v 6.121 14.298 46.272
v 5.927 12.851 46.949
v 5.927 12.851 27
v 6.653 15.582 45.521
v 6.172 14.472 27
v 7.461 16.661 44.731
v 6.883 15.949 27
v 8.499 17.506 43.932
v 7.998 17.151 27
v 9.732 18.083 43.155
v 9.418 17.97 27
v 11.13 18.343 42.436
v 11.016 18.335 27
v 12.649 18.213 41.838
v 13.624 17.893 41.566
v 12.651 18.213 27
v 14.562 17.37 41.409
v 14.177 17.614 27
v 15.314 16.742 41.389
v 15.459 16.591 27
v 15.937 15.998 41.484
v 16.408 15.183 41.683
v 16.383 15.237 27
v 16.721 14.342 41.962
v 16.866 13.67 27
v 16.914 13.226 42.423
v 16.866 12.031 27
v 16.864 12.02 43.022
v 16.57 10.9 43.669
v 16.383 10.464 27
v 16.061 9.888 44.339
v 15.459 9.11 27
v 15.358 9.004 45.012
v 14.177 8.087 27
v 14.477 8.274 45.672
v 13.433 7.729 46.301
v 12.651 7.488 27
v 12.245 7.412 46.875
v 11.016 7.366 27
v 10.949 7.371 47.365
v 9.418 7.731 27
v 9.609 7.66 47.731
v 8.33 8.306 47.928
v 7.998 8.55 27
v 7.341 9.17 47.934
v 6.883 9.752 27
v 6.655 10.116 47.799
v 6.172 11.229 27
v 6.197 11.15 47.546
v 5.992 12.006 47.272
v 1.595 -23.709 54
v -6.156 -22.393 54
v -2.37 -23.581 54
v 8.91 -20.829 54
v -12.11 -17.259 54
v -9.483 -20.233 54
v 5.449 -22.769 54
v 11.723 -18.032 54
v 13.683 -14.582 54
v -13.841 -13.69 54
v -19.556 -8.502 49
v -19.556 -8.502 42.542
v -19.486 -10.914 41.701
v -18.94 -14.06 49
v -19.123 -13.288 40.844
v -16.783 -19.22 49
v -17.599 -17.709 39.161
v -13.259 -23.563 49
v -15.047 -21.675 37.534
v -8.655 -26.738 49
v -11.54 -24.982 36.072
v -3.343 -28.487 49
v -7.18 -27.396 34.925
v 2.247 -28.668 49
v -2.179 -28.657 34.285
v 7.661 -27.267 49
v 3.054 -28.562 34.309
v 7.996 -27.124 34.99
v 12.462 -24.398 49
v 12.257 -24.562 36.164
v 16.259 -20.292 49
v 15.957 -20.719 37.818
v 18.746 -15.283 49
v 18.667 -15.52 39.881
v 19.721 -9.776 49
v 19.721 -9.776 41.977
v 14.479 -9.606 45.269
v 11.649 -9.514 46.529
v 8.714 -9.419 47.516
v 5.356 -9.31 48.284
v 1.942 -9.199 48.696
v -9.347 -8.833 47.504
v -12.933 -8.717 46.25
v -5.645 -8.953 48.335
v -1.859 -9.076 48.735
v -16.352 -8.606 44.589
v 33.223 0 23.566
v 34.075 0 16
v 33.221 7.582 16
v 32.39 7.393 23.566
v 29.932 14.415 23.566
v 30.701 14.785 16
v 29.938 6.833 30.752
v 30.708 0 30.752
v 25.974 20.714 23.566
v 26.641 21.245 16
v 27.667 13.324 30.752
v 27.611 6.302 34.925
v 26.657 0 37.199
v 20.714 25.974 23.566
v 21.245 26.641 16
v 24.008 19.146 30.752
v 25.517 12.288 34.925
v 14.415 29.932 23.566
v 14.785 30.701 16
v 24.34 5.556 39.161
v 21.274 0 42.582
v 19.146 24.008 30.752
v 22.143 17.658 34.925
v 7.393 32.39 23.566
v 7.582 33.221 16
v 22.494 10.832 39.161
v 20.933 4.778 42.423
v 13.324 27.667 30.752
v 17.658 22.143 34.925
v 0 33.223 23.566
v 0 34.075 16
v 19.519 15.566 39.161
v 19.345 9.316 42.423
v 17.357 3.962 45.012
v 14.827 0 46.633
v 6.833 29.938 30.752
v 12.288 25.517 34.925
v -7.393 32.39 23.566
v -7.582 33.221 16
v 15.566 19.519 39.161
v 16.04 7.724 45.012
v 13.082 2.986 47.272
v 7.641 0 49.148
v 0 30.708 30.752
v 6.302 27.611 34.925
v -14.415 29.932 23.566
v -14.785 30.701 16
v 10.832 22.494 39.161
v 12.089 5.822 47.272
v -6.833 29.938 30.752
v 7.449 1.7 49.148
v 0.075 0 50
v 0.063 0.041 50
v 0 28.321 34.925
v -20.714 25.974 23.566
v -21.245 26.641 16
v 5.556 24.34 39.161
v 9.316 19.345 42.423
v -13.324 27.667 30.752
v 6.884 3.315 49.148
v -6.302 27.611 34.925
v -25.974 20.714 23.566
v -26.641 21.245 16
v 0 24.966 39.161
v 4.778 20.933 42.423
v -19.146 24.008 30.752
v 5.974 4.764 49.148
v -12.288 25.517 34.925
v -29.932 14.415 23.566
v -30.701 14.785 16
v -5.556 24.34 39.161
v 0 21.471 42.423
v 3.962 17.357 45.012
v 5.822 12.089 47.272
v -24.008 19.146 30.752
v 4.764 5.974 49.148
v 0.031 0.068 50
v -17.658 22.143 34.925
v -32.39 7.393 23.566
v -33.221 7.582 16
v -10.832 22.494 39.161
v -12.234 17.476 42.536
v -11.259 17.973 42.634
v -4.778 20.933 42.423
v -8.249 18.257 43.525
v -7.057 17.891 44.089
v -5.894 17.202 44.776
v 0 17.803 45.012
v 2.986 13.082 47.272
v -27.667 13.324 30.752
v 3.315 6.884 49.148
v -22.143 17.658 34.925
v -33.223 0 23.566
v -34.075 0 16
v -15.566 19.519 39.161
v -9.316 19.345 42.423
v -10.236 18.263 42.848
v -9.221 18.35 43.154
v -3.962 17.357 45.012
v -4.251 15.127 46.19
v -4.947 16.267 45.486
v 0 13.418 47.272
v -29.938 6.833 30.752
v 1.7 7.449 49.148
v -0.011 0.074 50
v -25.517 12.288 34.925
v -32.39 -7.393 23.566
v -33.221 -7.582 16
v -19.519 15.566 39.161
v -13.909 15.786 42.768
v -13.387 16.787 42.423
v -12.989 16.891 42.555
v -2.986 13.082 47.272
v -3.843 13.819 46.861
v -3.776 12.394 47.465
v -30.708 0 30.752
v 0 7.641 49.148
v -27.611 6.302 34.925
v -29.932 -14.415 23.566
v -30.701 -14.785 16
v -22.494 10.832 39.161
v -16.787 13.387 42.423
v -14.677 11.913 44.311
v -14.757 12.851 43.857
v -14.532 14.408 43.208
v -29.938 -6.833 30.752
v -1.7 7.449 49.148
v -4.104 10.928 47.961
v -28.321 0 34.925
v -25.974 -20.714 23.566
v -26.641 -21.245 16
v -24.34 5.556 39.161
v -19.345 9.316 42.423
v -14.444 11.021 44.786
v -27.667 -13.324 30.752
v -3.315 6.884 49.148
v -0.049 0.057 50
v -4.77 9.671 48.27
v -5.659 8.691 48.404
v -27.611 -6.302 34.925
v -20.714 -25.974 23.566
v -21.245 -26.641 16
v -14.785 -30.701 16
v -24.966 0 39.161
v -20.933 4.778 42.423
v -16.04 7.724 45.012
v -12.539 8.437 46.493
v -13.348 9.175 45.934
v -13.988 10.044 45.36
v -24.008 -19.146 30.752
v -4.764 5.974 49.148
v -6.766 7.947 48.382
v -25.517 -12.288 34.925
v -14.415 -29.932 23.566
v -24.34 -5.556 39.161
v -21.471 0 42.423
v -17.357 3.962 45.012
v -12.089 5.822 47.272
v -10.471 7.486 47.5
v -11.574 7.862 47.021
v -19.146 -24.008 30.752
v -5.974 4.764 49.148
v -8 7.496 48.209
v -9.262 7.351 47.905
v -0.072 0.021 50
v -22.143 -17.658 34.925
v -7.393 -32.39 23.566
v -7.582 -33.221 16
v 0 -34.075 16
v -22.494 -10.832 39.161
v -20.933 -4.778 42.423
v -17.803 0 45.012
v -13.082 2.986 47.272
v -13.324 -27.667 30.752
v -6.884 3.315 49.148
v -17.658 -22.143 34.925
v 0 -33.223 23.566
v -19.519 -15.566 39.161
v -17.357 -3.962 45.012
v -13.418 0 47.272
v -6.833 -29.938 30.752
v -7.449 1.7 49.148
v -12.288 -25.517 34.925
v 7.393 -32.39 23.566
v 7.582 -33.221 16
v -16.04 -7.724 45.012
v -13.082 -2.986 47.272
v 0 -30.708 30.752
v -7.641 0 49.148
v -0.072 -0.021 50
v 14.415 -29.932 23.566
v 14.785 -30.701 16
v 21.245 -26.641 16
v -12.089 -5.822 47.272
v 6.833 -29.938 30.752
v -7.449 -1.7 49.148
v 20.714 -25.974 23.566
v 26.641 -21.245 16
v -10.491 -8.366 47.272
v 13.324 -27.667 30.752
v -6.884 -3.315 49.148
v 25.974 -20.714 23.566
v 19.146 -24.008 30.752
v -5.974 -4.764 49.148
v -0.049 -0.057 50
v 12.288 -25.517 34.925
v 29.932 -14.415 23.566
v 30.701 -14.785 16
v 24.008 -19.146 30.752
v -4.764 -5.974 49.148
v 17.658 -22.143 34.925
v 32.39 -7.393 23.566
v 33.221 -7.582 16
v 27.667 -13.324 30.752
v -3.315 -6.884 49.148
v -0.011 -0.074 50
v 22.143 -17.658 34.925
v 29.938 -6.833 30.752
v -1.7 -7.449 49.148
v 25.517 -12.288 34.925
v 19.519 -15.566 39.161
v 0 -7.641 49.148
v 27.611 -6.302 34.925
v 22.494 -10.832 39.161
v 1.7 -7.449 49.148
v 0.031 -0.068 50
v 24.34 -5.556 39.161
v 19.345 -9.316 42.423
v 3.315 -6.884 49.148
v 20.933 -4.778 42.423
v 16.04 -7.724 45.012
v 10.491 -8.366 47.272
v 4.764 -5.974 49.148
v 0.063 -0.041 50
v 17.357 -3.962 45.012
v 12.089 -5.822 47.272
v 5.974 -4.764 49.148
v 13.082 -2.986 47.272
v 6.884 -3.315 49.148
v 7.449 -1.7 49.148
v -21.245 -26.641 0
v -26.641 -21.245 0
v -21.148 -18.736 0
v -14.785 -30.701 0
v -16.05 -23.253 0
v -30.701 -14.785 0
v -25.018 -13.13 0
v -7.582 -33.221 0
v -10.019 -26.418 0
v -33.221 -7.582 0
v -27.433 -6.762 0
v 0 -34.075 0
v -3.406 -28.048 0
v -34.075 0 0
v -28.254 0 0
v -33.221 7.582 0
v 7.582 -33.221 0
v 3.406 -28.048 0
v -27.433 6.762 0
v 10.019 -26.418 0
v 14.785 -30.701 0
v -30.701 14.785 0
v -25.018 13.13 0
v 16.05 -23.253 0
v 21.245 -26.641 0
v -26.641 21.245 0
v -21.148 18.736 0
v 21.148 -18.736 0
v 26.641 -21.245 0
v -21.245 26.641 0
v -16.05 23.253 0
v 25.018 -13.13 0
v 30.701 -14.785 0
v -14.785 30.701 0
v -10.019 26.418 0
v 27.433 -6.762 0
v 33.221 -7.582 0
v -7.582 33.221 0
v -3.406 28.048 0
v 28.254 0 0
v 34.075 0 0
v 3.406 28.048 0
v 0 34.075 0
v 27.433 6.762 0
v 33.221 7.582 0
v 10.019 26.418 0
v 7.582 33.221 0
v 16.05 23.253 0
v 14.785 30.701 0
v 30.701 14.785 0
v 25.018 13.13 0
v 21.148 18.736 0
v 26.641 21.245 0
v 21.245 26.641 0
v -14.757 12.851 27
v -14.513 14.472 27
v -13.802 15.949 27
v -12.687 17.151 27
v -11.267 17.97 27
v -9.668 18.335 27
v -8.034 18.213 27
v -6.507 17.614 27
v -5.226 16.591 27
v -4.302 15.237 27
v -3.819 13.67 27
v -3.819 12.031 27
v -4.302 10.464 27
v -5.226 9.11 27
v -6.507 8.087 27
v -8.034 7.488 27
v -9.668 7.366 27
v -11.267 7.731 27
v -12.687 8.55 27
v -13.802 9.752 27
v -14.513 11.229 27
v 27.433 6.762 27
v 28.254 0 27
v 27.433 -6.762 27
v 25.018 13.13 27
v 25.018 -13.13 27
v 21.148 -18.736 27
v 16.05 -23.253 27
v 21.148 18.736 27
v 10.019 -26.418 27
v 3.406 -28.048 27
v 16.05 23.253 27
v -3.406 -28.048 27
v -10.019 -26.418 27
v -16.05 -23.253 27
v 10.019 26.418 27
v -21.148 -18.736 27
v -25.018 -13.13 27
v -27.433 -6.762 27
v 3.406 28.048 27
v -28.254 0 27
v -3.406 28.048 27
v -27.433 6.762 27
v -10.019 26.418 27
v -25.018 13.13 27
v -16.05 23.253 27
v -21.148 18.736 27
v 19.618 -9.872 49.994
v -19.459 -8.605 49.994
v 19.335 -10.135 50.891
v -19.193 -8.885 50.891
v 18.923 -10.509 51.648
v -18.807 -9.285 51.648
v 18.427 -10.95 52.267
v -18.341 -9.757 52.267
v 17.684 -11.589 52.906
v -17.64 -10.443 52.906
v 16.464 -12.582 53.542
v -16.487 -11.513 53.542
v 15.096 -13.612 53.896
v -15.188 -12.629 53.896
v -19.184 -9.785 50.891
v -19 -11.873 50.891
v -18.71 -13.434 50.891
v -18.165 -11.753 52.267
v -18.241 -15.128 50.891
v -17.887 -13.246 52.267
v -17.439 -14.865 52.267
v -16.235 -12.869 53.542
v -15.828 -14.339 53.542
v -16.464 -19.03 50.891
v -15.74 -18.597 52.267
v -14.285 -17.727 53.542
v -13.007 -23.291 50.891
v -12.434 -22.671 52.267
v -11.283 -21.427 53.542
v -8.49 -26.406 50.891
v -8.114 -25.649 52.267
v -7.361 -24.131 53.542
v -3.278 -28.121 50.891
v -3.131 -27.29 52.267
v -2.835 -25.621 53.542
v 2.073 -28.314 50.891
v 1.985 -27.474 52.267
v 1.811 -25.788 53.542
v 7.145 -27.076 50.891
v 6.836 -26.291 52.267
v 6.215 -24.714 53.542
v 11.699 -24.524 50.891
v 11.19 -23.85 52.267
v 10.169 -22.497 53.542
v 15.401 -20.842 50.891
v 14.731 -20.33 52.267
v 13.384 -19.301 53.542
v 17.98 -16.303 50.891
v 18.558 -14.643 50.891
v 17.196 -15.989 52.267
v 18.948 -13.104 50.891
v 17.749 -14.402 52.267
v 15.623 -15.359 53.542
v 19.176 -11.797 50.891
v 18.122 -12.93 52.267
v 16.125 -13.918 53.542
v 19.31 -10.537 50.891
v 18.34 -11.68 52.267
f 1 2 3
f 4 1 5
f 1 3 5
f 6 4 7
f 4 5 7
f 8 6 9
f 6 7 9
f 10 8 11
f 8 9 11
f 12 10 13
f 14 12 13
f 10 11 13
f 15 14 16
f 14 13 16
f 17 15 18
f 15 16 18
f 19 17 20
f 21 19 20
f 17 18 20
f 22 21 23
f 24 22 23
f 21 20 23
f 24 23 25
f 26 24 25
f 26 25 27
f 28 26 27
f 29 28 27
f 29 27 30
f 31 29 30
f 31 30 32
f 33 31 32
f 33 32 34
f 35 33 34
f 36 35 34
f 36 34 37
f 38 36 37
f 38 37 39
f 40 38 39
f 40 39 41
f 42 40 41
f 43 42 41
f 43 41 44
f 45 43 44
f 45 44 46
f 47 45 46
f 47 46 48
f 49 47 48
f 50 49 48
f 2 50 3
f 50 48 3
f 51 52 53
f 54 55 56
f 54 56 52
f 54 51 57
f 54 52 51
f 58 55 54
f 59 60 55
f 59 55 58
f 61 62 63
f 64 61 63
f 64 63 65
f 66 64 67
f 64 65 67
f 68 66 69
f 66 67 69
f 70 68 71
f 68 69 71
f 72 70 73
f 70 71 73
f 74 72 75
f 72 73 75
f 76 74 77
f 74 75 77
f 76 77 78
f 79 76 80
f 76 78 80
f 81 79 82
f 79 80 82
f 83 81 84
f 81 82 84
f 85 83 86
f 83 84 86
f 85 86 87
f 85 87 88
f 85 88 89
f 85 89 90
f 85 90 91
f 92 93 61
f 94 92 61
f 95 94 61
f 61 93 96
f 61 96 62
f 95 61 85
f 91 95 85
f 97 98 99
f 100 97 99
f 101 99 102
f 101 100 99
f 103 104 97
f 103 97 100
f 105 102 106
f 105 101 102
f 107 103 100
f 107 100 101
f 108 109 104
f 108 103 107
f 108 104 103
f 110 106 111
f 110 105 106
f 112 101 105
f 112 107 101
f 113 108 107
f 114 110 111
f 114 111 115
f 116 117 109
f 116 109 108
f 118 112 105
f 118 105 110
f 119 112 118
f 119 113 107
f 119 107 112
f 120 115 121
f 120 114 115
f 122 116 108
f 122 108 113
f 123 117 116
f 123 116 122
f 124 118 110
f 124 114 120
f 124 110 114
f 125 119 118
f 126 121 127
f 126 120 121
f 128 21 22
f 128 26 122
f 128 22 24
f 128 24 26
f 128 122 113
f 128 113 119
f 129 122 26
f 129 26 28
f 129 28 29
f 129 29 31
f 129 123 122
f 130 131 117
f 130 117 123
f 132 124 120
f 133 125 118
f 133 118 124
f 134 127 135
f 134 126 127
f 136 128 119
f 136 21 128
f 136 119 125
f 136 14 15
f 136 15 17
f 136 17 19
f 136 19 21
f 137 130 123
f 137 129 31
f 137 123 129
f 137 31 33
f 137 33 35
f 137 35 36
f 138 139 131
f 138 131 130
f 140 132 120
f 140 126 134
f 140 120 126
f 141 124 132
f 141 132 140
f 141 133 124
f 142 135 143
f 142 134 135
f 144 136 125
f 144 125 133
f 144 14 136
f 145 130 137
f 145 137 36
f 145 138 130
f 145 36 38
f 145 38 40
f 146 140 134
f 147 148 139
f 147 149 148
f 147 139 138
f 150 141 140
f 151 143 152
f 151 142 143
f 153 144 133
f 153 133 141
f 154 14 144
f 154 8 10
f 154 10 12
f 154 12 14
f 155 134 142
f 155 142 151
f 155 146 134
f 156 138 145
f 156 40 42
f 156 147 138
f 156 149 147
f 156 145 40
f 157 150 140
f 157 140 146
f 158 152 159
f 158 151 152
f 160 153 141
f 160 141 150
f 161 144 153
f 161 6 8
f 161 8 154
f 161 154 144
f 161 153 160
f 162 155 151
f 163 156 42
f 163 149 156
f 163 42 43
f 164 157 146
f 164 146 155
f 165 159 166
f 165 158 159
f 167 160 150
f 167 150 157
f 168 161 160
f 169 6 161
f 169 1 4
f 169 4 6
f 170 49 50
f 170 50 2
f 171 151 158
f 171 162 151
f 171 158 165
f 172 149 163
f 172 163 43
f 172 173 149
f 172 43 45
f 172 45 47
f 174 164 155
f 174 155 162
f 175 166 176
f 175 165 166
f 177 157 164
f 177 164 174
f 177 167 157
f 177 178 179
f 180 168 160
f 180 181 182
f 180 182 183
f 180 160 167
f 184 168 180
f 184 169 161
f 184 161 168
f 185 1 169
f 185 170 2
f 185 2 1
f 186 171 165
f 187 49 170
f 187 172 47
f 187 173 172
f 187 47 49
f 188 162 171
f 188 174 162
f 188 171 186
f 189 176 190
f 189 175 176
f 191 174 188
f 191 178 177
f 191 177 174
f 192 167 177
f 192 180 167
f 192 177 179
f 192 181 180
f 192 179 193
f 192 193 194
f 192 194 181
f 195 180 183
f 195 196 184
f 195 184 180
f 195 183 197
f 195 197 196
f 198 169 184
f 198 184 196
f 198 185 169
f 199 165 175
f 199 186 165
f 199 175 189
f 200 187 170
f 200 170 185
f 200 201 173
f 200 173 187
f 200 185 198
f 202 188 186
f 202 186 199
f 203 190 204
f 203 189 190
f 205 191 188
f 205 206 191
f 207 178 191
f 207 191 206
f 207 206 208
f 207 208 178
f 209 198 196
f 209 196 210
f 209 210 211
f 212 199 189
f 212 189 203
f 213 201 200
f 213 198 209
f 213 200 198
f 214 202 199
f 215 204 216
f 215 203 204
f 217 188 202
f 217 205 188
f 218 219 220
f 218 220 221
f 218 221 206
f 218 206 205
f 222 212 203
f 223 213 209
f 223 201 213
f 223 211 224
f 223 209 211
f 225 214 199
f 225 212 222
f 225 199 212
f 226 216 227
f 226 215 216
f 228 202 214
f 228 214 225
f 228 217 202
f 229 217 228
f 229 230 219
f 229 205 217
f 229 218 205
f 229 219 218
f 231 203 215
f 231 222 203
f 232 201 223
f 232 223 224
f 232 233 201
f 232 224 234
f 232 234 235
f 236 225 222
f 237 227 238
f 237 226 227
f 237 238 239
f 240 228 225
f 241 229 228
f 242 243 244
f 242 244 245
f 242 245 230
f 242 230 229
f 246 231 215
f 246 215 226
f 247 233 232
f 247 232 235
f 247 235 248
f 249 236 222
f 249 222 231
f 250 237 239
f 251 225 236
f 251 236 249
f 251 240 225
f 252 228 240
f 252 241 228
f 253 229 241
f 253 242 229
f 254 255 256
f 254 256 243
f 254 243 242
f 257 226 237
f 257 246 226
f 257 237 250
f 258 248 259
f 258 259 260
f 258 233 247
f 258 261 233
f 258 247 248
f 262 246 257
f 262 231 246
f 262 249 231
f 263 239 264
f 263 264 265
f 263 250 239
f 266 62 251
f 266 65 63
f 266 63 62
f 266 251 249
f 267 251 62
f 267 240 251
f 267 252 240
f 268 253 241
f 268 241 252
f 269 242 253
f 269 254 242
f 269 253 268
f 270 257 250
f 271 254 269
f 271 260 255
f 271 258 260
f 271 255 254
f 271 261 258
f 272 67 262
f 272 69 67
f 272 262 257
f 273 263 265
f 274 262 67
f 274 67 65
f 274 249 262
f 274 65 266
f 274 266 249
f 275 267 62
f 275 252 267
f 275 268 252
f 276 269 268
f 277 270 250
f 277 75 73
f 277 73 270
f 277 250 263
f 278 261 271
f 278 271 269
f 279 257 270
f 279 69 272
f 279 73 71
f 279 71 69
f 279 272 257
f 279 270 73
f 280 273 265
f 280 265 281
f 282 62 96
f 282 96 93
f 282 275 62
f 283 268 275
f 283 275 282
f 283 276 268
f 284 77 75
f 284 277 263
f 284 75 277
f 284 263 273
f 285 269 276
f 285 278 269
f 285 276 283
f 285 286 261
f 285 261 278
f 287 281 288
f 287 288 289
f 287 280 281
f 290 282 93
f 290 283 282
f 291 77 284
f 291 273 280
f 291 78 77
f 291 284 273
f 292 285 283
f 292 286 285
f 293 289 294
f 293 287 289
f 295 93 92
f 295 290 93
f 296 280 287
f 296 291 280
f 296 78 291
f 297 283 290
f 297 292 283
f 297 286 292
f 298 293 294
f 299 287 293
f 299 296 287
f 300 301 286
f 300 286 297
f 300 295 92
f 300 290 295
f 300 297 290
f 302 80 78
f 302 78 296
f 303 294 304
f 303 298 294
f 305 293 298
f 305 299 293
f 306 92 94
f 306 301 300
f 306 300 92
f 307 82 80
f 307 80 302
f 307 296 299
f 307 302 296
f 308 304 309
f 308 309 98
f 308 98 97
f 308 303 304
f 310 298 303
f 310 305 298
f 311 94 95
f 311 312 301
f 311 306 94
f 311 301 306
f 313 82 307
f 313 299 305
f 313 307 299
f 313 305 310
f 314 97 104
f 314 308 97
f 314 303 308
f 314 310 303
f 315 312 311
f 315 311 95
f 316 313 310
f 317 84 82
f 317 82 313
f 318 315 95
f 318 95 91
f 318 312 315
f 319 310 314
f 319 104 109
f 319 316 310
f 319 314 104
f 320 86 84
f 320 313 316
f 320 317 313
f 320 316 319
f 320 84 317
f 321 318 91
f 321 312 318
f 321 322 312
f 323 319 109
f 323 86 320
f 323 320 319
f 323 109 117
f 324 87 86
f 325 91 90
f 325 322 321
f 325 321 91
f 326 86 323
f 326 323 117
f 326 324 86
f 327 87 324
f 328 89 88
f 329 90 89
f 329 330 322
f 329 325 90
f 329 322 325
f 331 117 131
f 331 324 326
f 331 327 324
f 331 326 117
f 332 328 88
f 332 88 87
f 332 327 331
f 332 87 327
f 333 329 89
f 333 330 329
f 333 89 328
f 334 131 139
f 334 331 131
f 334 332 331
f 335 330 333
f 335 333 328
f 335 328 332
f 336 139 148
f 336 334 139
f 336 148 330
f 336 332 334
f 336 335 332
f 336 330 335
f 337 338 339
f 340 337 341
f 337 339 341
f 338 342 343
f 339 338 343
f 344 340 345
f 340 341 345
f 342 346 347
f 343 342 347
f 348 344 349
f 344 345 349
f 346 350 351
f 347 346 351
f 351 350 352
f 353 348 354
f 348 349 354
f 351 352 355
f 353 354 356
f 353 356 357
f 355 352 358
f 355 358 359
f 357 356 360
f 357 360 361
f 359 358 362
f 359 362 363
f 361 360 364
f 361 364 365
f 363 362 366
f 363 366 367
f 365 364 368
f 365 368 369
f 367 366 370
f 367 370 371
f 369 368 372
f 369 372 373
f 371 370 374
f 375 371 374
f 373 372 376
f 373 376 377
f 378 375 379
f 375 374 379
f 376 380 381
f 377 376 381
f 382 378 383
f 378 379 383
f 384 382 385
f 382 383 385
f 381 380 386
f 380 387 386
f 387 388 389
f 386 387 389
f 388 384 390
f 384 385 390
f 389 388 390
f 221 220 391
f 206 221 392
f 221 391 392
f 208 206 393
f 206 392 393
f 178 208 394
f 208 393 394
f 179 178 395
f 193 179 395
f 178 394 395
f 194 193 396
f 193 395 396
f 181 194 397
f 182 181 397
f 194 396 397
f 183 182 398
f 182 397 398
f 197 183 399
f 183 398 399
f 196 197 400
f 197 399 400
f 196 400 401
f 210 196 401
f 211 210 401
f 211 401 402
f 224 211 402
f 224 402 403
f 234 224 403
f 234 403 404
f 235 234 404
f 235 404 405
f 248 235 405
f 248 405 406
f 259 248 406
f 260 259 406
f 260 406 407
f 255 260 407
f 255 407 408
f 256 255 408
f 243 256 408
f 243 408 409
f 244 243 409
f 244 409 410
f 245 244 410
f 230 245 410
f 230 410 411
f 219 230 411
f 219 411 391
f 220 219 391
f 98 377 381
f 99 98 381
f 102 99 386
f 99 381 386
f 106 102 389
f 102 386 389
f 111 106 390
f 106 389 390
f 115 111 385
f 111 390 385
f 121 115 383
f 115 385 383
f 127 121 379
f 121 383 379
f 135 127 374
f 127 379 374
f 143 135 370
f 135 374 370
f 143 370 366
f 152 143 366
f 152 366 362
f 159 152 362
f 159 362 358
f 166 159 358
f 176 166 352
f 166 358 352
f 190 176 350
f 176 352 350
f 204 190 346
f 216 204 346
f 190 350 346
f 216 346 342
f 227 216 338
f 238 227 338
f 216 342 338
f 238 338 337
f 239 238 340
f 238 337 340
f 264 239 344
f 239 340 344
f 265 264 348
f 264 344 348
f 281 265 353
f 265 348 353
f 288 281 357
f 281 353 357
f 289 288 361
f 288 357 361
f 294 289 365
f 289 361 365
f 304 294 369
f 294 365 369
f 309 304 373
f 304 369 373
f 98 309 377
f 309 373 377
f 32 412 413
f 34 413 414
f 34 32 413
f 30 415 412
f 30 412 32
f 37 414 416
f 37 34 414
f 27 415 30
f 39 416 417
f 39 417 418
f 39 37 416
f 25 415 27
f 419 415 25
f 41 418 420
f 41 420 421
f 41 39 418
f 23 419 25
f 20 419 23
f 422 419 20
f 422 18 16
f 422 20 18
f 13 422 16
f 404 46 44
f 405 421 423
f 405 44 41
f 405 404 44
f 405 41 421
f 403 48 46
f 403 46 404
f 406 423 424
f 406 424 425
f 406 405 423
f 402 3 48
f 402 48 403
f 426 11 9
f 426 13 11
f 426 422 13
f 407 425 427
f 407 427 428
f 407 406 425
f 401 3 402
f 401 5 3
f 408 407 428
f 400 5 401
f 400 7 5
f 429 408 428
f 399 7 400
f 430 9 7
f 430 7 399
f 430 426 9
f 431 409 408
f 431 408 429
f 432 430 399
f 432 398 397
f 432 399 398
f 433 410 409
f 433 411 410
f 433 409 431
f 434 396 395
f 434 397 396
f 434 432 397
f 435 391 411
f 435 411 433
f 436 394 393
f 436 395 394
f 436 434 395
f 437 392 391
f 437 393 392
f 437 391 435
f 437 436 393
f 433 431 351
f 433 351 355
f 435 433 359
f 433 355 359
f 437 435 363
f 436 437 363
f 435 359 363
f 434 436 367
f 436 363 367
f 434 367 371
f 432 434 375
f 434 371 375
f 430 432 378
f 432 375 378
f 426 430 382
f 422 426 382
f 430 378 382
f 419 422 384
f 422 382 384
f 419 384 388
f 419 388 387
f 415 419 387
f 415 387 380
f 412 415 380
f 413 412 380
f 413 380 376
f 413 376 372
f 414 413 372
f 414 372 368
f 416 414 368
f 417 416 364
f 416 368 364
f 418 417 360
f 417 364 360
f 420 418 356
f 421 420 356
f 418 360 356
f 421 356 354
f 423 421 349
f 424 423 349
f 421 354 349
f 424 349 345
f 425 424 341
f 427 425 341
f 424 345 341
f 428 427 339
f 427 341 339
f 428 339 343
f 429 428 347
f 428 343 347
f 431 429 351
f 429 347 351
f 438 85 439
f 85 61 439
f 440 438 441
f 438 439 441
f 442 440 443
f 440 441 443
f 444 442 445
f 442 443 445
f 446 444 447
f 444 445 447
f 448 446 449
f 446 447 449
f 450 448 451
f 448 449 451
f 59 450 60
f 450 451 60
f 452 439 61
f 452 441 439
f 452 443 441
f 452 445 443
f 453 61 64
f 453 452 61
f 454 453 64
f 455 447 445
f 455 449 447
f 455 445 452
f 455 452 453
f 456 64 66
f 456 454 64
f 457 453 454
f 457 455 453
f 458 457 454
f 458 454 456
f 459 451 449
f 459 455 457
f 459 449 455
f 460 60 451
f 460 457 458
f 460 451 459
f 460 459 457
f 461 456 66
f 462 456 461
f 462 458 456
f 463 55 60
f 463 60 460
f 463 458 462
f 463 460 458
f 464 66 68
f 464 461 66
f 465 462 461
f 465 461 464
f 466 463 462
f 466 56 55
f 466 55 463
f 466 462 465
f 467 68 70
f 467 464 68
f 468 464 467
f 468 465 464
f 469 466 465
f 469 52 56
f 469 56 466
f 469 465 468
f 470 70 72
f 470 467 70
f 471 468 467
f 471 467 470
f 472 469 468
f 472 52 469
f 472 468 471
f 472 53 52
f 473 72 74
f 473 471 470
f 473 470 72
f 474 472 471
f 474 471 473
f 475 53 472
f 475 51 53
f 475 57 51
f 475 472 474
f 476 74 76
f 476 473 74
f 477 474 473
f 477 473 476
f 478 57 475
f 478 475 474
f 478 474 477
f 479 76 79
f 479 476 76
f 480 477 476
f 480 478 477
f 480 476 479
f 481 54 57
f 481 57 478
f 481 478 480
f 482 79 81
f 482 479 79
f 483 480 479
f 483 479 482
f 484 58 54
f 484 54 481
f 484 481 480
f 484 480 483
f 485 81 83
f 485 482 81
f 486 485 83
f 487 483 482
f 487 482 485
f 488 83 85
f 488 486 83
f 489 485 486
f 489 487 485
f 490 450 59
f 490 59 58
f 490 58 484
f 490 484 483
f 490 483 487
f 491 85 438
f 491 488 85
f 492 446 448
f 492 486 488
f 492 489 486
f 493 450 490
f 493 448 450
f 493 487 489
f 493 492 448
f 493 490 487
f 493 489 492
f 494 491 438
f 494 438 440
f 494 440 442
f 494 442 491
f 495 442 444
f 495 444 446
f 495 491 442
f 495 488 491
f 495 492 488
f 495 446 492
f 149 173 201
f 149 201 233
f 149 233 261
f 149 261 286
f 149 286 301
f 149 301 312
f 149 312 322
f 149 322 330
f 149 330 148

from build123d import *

# Parameters (mm, degrees)
SKETCH1_R           = 34.075
BOSS_EXTRUDE1_DEPTH = 50
FILLET1_R           = 34
SKETCH3_R           = 5.5
CUT_EXTRUDE1_DEPTH  = 57
BOSS_EXTRUDE2_DEPTH = 54
FILLET2_R           = 5
SKETCH5_R           = 28.2539
CUT_EXTRUDE2_DEPTH  = 27


with BuildPart() as part:
    # Sketch1 → Boss-Extrude1 (new body)
    with BuildSketch(Plane.XY):
        Circle(SKETCH1_R)
    extrude(amount=BOSS_EXTRUDE1_DEPTH)

    # Fillet1
    fillet1_edges = [part.edges().sort_by_distance(p)[0] for p in [
        (-34.075, 0, 50),
    ]]
    fillet(fillet1_edges, radius=FILLET1_R)

    # Sketch3 → Cut-Extrude1 (cut)
    with BuildSketch(Plane(origin=(0, 0, 0), x_dir=(-1, 0, 0), z_dir=(0, 0, -1))):
        with Locations((-11.427232, 12.850521)):
            Circle(SKETCH3_R)
        with Locations((9.257377, 12.850521)):
            Circle(SKETCH3_R)
    extrude(amount=-CUT_EXTRUDE1_DEPTH, mode=Mode.SUBTRACT)

    # Sketch4 → Boss-Extrude2 (add)
    with BuildSketch(Plane(origin=(0, 0, 0), x_dir=(-1, 0, 0), z_dir=(0, 0, -1))):
        with BuildLine():
            Line((-19.721396, -9.77574), (19.555863, -8.501695))
            ThreePointArc((19.555863, -8.501695), (0.554256, -28.777347), (-19.721396, -9.77574))
        make_face()
    extrude(amount=-BOSS_EXTRUDE2_DEPTH)

    # Fillet2
    fillet2_edges = [part.edges().sort_by_distance(p)[0] for p in [
        (-0.554256, -28.777347, 54),
        (0.082767, -9.138717, 54),
    ]]
    fillet(fillet2_edges, radius=FILLET2_R)

    # Sketch5 → Cut-Extrude2 (cut)
    with BuildSketch(Plane(origin=(0, 0, 0), x_dir=(-1, 0, 0), z_dir=(0, 0, -1))):
        Circle(SKETCH5_R)
    extrude(amount=-CUT_EXTRUDE2_DEPTH, mode=Mode.SUBTRACT)


solid = part.part
